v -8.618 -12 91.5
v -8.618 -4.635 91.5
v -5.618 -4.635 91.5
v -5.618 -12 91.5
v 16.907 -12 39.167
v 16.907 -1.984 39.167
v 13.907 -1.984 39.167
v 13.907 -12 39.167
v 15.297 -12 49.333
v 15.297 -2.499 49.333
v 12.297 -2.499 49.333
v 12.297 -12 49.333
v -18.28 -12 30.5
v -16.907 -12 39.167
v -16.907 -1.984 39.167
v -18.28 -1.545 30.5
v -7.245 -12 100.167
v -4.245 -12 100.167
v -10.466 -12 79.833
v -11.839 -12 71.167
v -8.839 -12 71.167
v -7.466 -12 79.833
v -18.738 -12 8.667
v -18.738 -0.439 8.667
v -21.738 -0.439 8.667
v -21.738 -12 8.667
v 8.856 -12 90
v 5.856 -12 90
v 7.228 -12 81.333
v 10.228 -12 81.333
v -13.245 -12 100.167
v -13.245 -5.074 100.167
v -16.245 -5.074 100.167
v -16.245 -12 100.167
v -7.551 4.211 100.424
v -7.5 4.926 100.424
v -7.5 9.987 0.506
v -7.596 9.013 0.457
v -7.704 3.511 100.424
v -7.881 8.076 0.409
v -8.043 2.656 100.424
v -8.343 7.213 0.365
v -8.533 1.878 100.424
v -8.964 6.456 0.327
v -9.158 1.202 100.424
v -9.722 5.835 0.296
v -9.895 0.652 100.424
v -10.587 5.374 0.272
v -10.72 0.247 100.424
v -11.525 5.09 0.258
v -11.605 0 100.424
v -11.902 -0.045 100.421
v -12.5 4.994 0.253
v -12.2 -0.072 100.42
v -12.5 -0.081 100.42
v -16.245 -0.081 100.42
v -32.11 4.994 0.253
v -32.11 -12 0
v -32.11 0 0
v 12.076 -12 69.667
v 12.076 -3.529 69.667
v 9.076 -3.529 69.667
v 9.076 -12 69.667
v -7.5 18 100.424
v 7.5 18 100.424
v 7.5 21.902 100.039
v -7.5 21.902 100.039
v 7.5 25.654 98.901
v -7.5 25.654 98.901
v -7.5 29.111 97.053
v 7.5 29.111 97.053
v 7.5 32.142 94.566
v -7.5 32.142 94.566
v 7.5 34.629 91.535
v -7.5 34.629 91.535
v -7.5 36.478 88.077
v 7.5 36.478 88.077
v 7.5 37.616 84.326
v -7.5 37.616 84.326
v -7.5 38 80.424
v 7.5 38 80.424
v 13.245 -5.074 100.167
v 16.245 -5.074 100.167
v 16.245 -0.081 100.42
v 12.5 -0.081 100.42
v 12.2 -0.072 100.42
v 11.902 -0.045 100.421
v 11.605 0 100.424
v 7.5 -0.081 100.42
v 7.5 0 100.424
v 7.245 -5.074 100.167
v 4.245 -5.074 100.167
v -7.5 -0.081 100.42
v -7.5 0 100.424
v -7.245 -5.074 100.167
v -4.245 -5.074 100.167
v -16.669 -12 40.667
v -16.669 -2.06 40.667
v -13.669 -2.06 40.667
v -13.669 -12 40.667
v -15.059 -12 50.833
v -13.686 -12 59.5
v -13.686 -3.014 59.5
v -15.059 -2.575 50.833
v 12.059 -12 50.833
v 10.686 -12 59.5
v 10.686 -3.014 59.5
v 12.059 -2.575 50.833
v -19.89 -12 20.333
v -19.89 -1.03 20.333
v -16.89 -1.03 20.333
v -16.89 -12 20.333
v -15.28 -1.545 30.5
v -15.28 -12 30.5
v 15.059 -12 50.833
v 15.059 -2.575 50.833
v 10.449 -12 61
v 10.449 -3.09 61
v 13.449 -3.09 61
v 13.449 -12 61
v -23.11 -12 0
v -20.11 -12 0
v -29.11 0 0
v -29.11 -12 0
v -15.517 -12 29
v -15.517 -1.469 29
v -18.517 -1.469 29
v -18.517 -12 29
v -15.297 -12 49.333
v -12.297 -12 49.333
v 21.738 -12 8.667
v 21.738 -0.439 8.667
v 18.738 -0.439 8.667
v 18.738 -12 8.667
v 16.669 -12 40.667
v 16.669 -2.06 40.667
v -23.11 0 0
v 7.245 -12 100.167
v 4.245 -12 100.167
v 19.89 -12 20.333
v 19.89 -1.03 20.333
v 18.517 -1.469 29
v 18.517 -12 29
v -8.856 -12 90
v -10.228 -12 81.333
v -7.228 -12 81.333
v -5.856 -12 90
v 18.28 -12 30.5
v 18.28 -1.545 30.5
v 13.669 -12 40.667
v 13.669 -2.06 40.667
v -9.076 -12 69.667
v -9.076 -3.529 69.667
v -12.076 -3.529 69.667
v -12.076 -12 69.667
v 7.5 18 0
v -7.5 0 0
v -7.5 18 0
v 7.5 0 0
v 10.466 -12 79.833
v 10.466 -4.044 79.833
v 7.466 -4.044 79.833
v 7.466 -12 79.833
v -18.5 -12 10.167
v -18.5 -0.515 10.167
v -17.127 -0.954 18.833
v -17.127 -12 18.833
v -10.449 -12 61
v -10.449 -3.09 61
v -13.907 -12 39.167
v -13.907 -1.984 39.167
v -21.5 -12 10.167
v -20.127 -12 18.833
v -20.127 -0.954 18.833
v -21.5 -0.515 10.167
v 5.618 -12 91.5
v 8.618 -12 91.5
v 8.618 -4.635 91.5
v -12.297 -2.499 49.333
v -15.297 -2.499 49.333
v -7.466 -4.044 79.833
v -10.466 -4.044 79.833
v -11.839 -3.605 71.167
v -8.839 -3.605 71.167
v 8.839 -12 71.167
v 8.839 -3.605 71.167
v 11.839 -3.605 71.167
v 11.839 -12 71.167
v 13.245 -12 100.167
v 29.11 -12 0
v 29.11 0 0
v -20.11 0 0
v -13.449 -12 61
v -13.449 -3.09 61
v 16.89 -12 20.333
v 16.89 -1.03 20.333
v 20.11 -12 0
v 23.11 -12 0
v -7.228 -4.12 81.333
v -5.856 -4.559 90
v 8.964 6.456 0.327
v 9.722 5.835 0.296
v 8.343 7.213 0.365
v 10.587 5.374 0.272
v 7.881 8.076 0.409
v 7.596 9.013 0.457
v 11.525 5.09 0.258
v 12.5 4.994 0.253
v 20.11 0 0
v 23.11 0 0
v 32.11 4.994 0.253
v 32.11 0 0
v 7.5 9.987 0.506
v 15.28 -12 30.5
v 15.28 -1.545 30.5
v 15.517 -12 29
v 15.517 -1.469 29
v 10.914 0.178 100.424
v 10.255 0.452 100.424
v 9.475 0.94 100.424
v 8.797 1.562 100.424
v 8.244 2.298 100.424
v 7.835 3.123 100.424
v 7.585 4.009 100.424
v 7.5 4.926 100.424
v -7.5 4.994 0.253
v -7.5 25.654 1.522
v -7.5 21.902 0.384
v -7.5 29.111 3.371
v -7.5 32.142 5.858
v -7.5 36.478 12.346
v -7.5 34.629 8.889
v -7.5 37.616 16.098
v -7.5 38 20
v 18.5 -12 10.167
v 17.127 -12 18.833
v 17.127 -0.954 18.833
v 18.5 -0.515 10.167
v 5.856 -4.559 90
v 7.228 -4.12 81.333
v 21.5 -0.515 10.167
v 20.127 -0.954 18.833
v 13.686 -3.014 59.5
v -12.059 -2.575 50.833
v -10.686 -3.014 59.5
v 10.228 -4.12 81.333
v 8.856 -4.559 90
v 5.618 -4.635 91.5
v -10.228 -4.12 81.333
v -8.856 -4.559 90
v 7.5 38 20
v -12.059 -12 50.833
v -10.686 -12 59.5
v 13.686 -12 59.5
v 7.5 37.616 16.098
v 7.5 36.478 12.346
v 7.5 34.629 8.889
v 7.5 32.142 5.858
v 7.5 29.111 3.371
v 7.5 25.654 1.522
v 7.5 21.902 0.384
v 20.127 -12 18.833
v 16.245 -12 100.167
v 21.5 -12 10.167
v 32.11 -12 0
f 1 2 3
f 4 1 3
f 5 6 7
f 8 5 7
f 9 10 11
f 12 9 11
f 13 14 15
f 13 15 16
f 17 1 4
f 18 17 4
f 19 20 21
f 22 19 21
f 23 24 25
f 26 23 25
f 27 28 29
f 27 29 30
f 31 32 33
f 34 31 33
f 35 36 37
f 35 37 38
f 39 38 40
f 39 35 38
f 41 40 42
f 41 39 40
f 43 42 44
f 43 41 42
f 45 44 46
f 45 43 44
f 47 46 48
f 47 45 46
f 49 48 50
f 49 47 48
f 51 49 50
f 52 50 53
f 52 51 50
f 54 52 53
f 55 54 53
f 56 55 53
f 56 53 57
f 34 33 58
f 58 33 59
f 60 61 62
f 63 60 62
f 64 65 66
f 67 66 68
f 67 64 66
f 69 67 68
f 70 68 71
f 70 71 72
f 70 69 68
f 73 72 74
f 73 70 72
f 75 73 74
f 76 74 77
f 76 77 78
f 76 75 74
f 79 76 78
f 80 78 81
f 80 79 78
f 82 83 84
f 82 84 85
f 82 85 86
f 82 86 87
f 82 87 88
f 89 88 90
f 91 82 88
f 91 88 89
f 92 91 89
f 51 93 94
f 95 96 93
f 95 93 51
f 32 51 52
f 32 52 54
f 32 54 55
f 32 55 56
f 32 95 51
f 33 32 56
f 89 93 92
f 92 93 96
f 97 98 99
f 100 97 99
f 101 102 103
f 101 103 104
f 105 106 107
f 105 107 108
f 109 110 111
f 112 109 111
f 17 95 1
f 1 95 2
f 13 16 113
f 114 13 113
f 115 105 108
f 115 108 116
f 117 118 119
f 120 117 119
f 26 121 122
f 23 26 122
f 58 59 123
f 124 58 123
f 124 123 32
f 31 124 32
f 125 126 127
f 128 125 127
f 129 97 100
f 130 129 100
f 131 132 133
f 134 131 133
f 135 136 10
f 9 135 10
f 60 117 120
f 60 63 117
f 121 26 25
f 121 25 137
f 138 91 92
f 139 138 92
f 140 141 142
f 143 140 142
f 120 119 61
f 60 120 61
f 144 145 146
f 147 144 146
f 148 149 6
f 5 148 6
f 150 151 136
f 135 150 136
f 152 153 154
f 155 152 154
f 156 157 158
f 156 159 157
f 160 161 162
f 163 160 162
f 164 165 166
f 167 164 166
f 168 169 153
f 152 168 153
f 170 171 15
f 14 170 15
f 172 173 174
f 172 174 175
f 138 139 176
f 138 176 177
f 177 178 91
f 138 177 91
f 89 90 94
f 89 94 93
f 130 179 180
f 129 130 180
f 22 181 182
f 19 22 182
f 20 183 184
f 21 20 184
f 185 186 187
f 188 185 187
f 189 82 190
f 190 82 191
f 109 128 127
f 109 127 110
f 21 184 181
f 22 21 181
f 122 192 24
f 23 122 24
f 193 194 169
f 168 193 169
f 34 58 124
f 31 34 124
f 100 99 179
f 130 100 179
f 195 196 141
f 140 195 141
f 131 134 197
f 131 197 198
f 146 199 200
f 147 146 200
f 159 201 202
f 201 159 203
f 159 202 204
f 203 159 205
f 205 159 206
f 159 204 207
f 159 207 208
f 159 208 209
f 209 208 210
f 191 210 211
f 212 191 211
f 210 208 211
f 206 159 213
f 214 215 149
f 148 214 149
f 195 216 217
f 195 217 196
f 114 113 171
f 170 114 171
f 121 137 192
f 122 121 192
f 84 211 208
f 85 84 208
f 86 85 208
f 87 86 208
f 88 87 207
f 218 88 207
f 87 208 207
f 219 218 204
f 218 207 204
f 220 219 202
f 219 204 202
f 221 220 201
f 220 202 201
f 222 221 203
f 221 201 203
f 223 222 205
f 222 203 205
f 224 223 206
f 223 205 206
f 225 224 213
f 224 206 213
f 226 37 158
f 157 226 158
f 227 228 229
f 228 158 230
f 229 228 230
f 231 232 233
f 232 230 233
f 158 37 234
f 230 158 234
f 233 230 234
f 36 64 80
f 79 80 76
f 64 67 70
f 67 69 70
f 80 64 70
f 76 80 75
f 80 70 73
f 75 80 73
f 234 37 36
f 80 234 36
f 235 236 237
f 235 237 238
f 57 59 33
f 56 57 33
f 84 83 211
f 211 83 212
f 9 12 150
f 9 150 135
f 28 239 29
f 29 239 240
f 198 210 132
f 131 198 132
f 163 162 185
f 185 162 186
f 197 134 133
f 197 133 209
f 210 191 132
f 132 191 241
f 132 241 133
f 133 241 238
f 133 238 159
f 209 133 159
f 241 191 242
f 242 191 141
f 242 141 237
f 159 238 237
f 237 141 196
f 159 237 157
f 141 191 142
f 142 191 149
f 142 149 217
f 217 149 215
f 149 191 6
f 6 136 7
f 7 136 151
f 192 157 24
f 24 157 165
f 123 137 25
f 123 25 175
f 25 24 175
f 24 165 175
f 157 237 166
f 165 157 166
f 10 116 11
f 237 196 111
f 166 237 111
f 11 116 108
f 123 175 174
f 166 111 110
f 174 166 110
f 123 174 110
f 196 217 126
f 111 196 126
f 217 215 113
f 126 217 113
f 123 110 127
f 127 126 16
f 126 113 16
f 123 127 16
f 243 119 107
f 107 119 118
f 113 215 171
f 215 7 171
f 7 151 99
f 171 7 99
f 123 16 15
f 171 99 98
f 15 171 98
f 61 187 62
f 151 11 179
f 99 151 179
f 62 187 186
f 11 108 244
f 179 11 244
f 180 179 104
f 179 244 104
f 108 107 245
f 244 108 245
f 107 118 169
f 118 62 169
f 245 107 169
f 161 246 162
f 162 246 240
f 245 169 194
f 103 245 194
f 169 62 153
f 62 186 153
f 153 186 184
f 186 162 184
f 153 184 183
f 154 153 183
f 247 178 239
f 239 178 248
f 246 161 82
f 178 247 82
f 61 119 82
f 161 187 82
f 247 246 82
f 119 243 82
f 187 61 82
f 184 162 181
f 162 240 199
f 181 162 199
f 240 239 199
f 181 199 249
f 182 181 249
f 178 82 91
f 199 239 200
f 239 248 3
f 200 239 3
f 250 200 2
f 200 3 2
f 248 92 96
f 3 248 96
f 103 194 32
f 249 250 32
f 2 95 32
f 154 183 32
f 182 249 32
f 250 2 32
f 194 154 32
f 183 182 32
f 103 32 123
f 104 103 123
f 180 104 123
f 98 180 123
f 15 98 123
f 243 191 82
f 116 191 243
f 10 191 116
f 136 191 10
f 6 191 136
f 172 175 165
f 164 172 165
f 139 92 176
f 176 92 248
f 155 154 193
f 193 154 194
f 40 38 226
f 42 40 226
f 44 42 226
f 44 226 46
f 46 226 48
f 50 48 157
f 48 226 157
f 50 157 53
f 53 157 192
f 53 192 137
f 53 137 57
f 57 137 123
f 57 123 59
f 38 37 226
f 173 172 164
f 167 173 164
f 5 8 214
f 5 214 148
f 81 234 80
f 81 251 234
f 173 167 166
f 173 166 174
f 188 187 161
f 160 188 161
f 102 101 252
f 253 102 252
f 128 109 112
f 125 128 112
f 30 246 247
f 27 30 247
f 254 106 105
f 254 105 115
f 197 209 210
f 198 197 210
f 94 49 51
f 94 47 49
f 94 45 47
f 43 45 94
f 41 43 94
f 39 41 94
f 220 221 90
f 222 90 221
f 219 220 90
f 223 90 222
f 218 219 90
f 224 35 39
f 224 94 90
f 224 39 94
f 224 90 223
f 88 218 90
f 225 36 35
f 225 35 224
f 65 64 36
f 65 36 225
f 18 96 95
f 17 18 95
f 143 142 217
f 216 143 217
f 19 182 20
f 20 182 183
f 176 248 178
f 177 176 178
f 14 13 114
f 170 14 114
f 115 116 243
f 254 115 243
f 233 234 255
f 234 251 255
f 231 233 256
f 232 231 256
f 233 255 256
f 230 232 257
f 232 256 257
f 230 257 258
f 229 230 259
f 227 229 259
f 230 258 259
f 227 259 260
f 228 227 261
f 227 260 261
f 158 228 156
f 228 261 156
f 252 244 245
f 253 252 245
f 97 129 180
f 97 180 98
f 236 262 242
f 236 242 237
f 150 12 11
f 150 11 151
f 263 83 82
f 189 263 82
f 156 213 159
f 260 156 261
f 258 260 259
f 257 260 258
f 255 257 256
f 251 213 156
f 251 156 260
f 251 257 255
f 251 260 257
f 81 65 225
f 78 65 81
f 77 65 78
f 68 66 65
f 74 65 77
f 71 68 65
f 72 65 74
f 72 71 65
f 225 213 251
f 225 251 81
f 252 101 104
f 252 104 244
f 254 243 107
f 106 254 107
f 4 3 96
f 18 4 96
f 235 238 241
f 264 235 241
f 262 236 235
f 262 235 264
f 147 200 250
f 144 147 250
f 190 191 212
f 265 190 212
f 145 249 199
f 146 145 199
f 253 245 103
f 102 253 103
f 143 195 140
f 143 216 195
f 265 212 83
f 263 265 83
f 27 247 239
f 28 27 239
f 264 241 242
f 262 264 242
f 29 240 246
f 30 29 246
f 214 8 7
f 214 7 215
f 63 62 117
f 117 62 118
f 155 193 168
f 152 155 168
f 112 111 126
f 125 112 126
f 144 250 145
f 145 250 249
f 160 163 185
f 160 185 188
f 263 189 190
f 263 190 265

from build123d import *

# Parameters (mm, degrees)
F1_DEPTH     = 12
F3_DEPTH     = 40
F5_DEPTH     = 5
F6_W         = 38
F6_H         = 100.4237157875
F7_DEPTH     = 7.5
F9_DEPTH     = 7.5
F10_T4_DEPTH = 100.2951088773
F10_T9_DEPTH = 100.2951088773
F11_R        = 20


# Not quite as in the source:
# - a fillet or chamfer that OpenCascade refuses, or shapes differently, is made with other operations: its cross-section is extruded or revolved along the edge and cut away or added


with BuildPart() as f1:
    # F0 (on Front) → F1 (new body)
    with BuildSketch(Plane.XZ):
        Polygon((-18.7375766605, 8.6666666667), (-21.7375766605, 8.6666666667), (-23.11024181, 0), (-20.11024181, 0), align=None)
    extrude(amount=F1_DEPTH)


with BuildPart() as f1b:
    # F0 (on Front) → F1, piece 2 (new body)
    with BuildSketch(Plane.XZ):
        Polygon((21.7375766605, 8.6666666667), (18.7375766605, 8.6666666667), (20.11024181, 0), (23.11024181, 0), align=None)
    extrude(amount=F1_DEPTH)


with BuildPart() as f1c:
    # F0 (on Front) → F1, piece 3 (new body)
    with BuildSketch(Plane.XZ):
        Polygon((-20.1273348505, 18.8333333333), (-21.5, 10.1666666667), (-18.5, 10.1666666667), (-17.1273348505, 18.8333333333), align=None)
    extrude(amount=F1_DEPTH)


with BuildPart() as f1d:
    # F0 (on Front) → F1, piece 4 (new body)
    with BuildSketch(Plane.XZ):
        Polygon((17.1273348505, 18.8333333333), (18.5, 10.1666666667), (21.5, 10.1666666667), (20.1273348505, 18.8333333333), align=None)
    extrude(amount=F1_DEPTH)


with BuildPart() as f1e:
    # F0 (on Front) → F1, piece 5 (new body)
    with BuildSketch(Plane.XZ):
        Polygon((-15.5170930406, 29), (-18.5170930406, 29), (-19.88975819, 20.3333333333), (-16.88975819, 20.3333333333), align=None)
    extrude(amount=F1_DEPTH)


with BuildPart() as f1f:
    # F0 (on Front) → F1, piece 6 (new body)
    with BuildSketch(Plane.XZ):
        Polygon((16.88975819, 20.3333333333), (19.88975819, 20.3333333333), (18.5170930406, 29), (15.5170930406, 29), align=None)
    extrude(amount=F1_DEPTH)


with BuildPart() as f1g:
    # F0 (on Front) → F1, piece 7 (new body)
    with BuildSketch(Plane.XZ):
        Polygon((-15.2966094206, 49.3333333333), (-16.6692745701, 40.6666666667), (-13.6692745701, 40.6666666667), (-12.2966094206, 49.3333333333), align=None)
    extrude(amount=F1_DEPTH)


with BuildPart() as f1h:
    # F0 (on Front) → F1, piece 8 (new body)
    with BuildSketch(Plane.XZ):
        Polygon((-10.6863676107, 59.5), (-13.6863676107, 59.5), (-15.0590327601, 50.8333333333), (-12.0590327601, 50.8333333333), align=None)
    extrude(amount=F1_DEPTH)


with BuildPart() as f1i:
    # F0 (on Front) → F1, piece 9 (new body)
    with BuildSketch(Plane.XZ):
        Polygon((-11.8385491402, 71.1666666667), (-8.8385491402, 71.1666666667), (-7.4658839907, 79.8333333333), (-10.4658839907, 79.8333333333), align=None)
    extrude(amount=F1_DEPTH)


with BuildPart() as f1j:
    # F0 (on Front) → F1, piece 10 (new body)
    with BuildSketch(Plane.XZ):
        Polygon((-5.8556421808, 90), (-8.8556421808, 90), (-10.2283073302, 81.3333333333), (-7.2283073302, 81.3333333333), align=None)
    extrude(amount=F1_DEPTH)


with BuildPart() as f1k:
    # F0 (on Front) → F1, piece 11 (new body)
    with BuildSketch(Plane.XZ):
        Polygon((-4.2454003708, 100.1666666667), (-7.2454003708, 100.1666666667), (-8.6180655203, 91.5), (-5.6180655203, 91.5), align=None)
    extrude(amount=F1_DEPTH)


with BuildPart() as f1l:
    # F0 (on Front) → F1, piece 12 (new body)
    with BuildSketch(Plane.XZ):
        Polygon((16.9068512306, 39.1666666667), (13.9068512306, 39.1666666667), (15.2795163801, 30.5), (18.2795163801, 30.5), align=None)
    extrude(amount=F1_DEPTH)


with BuildPart() as f1m:
    # F0 (on Front) → F1, piece 13 (new body)
    with BuildSketch(Plane.XZ):
        Polygon((15.2966094206, 49.3333333333), (12.2966094206, 49.3333333333), (13.6692745701, 40.6666666667), (16.6692745701, 40.6666666667), align=None)
    extrude(amount=F1_DEPTH)


with BuildPart() as f1n:
    # F0 (on Front) → F1, piece 14 (new body)
    with BuildSketch(Plane.XZ):
        Polygon((13.6863676107, 59.5), (10.6863676107, 59.5), (12.0590327601, 50.8333333333), (15.0590327601, 50.8333333333), align=None)
    extrude(amount=F1_DEPTH)


with BuildPart() as f1o:
    # F0 (on Front) → F1, piece 15 (new body)
    with BuildSketch(Plane.XZ):
        Polygon((10.4487909502, 61), (13.4487909502, 61), (12.0761258007, 69.6666666667), (9.0761258007, 69.6666666667), align=None)
    extrude(amount=F1_DEPTH)


with BuildPart() as f1p:
    # F0 (on Front) → F1, piece 16 (new body)
    with BuildSketch(Plane.XZ):
        Polygon((10.4658839907, 79.8333333333), (7.4658839907, 79.8333333333), (8.8385491402, 71.1666666667), (11.8385491402, 71.1666666667), align=None)
    extrude(amount=F1_DEPTH)


with BuildPart() as f1q:
    # F0 (on Front) → F1, piece 17 (new body)
    with BuildSketch(Plane.XZ):
        Polygon((8.8556421808, 90), (5.8556421808, 90), (7.2283073302, 81.3333333333), (10.2283073302, 81.3333333333), align=None)
    extrude(amount=F1_DEPTH)


with BuildPart() as f1r:
    # F0 (on Front) → F1, piece 18 (new body)
    with BuildSketch(Plane.XZ):
        Polygon((-13.9068512306, 39.1666666667), (-16.9068512306, 39.1666666667), (-18.2795163801, 30.5), (-15.2795163801, 30.5), align=None)
    extrude(amount=F1_DEPTH)


with BuildPart() as f1s:
    # F0 (on Front) → F1, piece 19 (new body)
    with BuildSketch(Plane.XZ):
        Polygon((-12.0761258007, 69.6666666667), (-13.4487909502, 61), (-10.4487909502, 61), (-9.0761258007, 69.6666666667), align=None)
    extrude(amount=F1_DEPTH)


with BuildPart() as f1t:
    # F0 (on Front) → F1, piece 20 (new body)
    with BuildSketch(Plane.XZ):
        Polygon((7.2454003708, 100.1666666667), (4.2454003708, 100.1666666667), (5.6180655203, 91.5), (8.6180655203, 91.5), align=None)
    extrude(amount=F1_DEPTH)


with BuildPart() as f1u:
    # F0 (on Front) → F1, piece 21 (new body)
    with BuildSketch(Plane.XZ):
        Polygon((-29.11024181, 0), (-13.2454003708, 100.1666666667), (-16.2454003708, 100.1666666667), (-32.11024181, 0), align=None)
    extrude(amount=F1_DEPTH)


with BuildPart() as f1v:
    # F0 (on Front) → F1, piece 22 (new body)
    with BuildSketch(Plane.XZ):
        Polygon((16.2454003708, 100.1666666667), (13.2454003708, 100.1666666667), (29.11024181, 0), (32.11024181, 0), align=None)
    extrude(amount=F1_DEPTH)


with BuildPart() as f3_tool:
    # F2 (on Right) → F3 (new body, symmetric)
    with BuildSketch(Plane.YZ):
        Polygon((-5.0742244334, 100.1666666667), (0, 0), (0, 100.1666666667), align=None)
    extrude(amount=F3_DEPTH, both=True)


with BuildPart() as f1_1:
    add(f1.part)

    # F3: cut by f3_tool
    add(f3_tool.part, mode=Mode.SUBTRACT)



with BuildPart() as f1b_1:
    add(f1b.part)

    # F3: cut by f3_tool
    add(f3_tool.part, mode=Mode.SUBTRACT)


with BuildPart() as f1c_1:
    add(f1c.part)

    # F3: cut by f3_tool
    add(f3_tool.part, mode=Mode.SUBTRACT)


with BuildPart() as f1d_1:
    add(f1d.part)

    # F3: cut by f3_tool
    add(f3_tool.part, mode=Mode.SUBTRACT)


with BuildPart() as f1e_1:
    add(f1e.part)

    # F3: cut by f3_tool
    add(f3_tool.part, mode=Mode.SUBTRACT)


with BuildPart() as f1f_1:
    add(f1f.part)

    # F3: cut by f3_tool
    add(f3_tool.part, mode=Mode.SUBTRACT)


with BuildPart() as f1g_1:
    add(f1g.part)

    # F3: cut by f3_tool
    add(f3_tool.part, mode=Mode.SUBTRACT)


with BuildPart() as f1h_1:
    add(f1h.part)

    # F3: cut by f3_tool
    add(f3_tool.part, mode=Mode.SUBTRACT)


with BuildPart() as f1i_1:
    add(f1i.part)

    # F3: cut by f3_tool
    add(f3_tool.part, mode=Mode.SUBTRACT)


with BuildPart() as f1j_1:
    add(f1j.part)

    # F3: cut by f3_tool
    add(f3_tool.part, mode=Mode.SUBTRACT)


with BuildPart() as f1k_1:
    add(f1k.part)

    # F3: cut by f3_tool
    add(f3_tool.part, mode=Mode.SUBTRACT)


with BuildPart() as f1l_1:
    add(f1l.part)

    # F3: cut by f3_tool
    add(f3_tool.part, mode=Mode.SUBTRACT)


with BuildPart() as f1m_1:
    add(f1m.part)

    # F3: cut by f3_tool
    add(f3_tool.part, mode=Mode.SUBTRACT)


with BuildPart() as f1n_1:
    add(f1n.part)

    # F3: cut by f3_tool
    add(f3_tool.part, mode=Mode.SUBTRACT)


with BuildPart() as f1o_1:
    add(f1o.part)

    # F3: cut by f3_tool
    add(f3_tool.part, mode=Mode.SUBTRACT)


with BuildPart() as f1p_1:
    add(f1p.part)

    # F3: cut by f3_tool
    add(f3_tool.part, mode=Mode.SUBTRACT)


with BuildPart() as f1q_1:
    add(f1q.part)

    # F3: cut by f3_tool
    add(f3_tool.part, mode=Mode.SUBTRACT)


with BuildPart() as f1r_1:
    add(f1r.part)

    # F3: cut by f3_tool
    add(f3_tool.part, mode=Mode.SUBTRACT)


with BuildPart() as f1s_1:
    add(f1s.part)

    # F3: cut by f3_tool
    add(f3_tool.part, mode=Mode.SUBTRACT)


with BuildPart() as f1t_1:
    add(f1t.part)

    # F3: cut by f3_tool
    add(f3_tool.part, mode=Mode.SUBTRACT)


with BuildPart() as f1u_1:
    add(f1u.part)

    # F3: cut by f3_tool
    add(f3_tool.part, mode=Mode.SUBTRACT)


with BuildPart() as f1v_1:
    add(f1v.part)

    # F3: cut by f3_tool
    add(f3_tool.part, mode=Mode.SUBTRACT)


with BuildPart() as f1_2:
    add(f1_1.part)

    add(f1b_1.part)  # F5 merges F1b

    add(f1c_1.part)  # F5 merges F1c

    add(f1d_1.part)  # F5 merges F1d

    add(f1e_1.part)  # F5 merges F1e

    add(f1f_1.part)  # F5 merges F1f

    add(f1g_1.part)  # F5 merges F1g

    add(f1h_1.part)  # F5 merges F1h

    add(f1i_1.part)  # F5 merges F1i

    add(f1j_1.part)  # F5 merges F1j

    add(f1k_1.part)  # F5 merges F1k

    add(f1l_1.part)  # F5 merges F1l

    add(f1m_1.part)  # F5 merges F1m

    add(f1n_1.part)  # F5 merges F1n

    add(f1o_1.part)  # F5 merges F1o

    add(f1p_1.part)  # F5 merges F1p

    add(f1q_1.part)  # F5 merges F1q

    add(f1r_1.part)  # F5 merges F1r

    add(f1s_1.part)  # F5 merges F1s

    add(f1t_1.part)  # F5 merges F1t

    add(f1u_1.part)  # F5 merges F1u

    add(f1v_1.part)  # F5 merges F1v
    # F4 (on face) → F5 (join)
    with BuildSketch(Plane(origin=(0, 0, 0), x_dir=(-1, 0, 0), z_dir=(0, 0.9987193572, 0.0505929401))):
        Polygon((16.2454003708, 100.2951088773), (-16.2454003708, 100.2951088773), (-32.11024181, 0), (32.11024181, 0), align=None)
    extrude(amount=F5_DEPTH)

    # F6 (on Right) → F7 (join, symmetric)
    with BuildSketch(Plane.YZ):
        with Locations((19, 50.2118578937)):
            Rectangle(F6_W, F6_H)
    extrude(amount=F7_DEPTH, both=True)

    # F8 (on Right) → F9 (join, symmetric)
    with BuildSketch(Plane.YZ):
        Polygon((0.7220453882, 99.8437014869), (0, 100.4237157875), (-0.0806276475, 100.4196313671), (-0.4271789039, 99.9818352512), (-0.1710176838, 98.3370152763), align=None)
    extrude(amount=F9_DEPTH, both=True)

    # F10: fillet of radius 5 on 2 edges, made by hand


with BuildPart() as f10_tool2:
    # F10_s3 → F10_t4 (new body)
    with BuildSketch(Plane(origin=(0, 0, 0), x_dir=(1, 0, 0), z_dir=(0, -0.0505929401, 0.9987193572))):
        with BuildLine():
            ThreePointArc((12.5, 5), (8.9644660941, 6.4644660941), (7.5, 10))
            Line((7.5, 10), (7.5, 5))
            Line((7.5, 5), (12.5, 5))
        make_face()
    extrude(amount=F10_T4_DEPTH)

    split(bisect_by=Plane.XY.offset(100.4237157875), keep=Keep.BOTTOM)


with BuildPart() as f1_3:
    add(f1_2.part)

    # F10_t1: union F10_tool2
    add(f10_tool2.part)


with BuildPart() as f10_tool7:
    # F10_s8 → F10_t9 (new body)
    with BuildSketch(Plane(origin=(0, -5.0742244334, 100.1666666667), x_dir=(1, 0, 0), z_dir=(0, 0.0505929401, -0.9987193572))):
        with BuildLine():
            ThreePointArc((-7.5, -10), (-8.9644660941, -6.4644660941), (-12.5, -5))
            Line((-12.5, -5), (-7.5, -5))
            Line((-7.5, -5), (-7.5, -10))
        make_face()
    extrude(amount=F10_T9_DEPTH)

    split(bisect_by=Plane.XY.offset(100.4237157875), keep=Keep.BOTTOM)


with BuildPart() as f1_4:
    add(f1_3.part)

    # F10_t6: union F10_tool7
    add(f10_tool7.part)

    # F11
    f11_edges = [f1_4.edges().sort_by_distance(p)[0] for p in [
        (0, 38, 100.423716),
        (0, 38, 0),
    ]]
    fillet(f11_edges, radius=F11_R)


solid = f1_4.part
